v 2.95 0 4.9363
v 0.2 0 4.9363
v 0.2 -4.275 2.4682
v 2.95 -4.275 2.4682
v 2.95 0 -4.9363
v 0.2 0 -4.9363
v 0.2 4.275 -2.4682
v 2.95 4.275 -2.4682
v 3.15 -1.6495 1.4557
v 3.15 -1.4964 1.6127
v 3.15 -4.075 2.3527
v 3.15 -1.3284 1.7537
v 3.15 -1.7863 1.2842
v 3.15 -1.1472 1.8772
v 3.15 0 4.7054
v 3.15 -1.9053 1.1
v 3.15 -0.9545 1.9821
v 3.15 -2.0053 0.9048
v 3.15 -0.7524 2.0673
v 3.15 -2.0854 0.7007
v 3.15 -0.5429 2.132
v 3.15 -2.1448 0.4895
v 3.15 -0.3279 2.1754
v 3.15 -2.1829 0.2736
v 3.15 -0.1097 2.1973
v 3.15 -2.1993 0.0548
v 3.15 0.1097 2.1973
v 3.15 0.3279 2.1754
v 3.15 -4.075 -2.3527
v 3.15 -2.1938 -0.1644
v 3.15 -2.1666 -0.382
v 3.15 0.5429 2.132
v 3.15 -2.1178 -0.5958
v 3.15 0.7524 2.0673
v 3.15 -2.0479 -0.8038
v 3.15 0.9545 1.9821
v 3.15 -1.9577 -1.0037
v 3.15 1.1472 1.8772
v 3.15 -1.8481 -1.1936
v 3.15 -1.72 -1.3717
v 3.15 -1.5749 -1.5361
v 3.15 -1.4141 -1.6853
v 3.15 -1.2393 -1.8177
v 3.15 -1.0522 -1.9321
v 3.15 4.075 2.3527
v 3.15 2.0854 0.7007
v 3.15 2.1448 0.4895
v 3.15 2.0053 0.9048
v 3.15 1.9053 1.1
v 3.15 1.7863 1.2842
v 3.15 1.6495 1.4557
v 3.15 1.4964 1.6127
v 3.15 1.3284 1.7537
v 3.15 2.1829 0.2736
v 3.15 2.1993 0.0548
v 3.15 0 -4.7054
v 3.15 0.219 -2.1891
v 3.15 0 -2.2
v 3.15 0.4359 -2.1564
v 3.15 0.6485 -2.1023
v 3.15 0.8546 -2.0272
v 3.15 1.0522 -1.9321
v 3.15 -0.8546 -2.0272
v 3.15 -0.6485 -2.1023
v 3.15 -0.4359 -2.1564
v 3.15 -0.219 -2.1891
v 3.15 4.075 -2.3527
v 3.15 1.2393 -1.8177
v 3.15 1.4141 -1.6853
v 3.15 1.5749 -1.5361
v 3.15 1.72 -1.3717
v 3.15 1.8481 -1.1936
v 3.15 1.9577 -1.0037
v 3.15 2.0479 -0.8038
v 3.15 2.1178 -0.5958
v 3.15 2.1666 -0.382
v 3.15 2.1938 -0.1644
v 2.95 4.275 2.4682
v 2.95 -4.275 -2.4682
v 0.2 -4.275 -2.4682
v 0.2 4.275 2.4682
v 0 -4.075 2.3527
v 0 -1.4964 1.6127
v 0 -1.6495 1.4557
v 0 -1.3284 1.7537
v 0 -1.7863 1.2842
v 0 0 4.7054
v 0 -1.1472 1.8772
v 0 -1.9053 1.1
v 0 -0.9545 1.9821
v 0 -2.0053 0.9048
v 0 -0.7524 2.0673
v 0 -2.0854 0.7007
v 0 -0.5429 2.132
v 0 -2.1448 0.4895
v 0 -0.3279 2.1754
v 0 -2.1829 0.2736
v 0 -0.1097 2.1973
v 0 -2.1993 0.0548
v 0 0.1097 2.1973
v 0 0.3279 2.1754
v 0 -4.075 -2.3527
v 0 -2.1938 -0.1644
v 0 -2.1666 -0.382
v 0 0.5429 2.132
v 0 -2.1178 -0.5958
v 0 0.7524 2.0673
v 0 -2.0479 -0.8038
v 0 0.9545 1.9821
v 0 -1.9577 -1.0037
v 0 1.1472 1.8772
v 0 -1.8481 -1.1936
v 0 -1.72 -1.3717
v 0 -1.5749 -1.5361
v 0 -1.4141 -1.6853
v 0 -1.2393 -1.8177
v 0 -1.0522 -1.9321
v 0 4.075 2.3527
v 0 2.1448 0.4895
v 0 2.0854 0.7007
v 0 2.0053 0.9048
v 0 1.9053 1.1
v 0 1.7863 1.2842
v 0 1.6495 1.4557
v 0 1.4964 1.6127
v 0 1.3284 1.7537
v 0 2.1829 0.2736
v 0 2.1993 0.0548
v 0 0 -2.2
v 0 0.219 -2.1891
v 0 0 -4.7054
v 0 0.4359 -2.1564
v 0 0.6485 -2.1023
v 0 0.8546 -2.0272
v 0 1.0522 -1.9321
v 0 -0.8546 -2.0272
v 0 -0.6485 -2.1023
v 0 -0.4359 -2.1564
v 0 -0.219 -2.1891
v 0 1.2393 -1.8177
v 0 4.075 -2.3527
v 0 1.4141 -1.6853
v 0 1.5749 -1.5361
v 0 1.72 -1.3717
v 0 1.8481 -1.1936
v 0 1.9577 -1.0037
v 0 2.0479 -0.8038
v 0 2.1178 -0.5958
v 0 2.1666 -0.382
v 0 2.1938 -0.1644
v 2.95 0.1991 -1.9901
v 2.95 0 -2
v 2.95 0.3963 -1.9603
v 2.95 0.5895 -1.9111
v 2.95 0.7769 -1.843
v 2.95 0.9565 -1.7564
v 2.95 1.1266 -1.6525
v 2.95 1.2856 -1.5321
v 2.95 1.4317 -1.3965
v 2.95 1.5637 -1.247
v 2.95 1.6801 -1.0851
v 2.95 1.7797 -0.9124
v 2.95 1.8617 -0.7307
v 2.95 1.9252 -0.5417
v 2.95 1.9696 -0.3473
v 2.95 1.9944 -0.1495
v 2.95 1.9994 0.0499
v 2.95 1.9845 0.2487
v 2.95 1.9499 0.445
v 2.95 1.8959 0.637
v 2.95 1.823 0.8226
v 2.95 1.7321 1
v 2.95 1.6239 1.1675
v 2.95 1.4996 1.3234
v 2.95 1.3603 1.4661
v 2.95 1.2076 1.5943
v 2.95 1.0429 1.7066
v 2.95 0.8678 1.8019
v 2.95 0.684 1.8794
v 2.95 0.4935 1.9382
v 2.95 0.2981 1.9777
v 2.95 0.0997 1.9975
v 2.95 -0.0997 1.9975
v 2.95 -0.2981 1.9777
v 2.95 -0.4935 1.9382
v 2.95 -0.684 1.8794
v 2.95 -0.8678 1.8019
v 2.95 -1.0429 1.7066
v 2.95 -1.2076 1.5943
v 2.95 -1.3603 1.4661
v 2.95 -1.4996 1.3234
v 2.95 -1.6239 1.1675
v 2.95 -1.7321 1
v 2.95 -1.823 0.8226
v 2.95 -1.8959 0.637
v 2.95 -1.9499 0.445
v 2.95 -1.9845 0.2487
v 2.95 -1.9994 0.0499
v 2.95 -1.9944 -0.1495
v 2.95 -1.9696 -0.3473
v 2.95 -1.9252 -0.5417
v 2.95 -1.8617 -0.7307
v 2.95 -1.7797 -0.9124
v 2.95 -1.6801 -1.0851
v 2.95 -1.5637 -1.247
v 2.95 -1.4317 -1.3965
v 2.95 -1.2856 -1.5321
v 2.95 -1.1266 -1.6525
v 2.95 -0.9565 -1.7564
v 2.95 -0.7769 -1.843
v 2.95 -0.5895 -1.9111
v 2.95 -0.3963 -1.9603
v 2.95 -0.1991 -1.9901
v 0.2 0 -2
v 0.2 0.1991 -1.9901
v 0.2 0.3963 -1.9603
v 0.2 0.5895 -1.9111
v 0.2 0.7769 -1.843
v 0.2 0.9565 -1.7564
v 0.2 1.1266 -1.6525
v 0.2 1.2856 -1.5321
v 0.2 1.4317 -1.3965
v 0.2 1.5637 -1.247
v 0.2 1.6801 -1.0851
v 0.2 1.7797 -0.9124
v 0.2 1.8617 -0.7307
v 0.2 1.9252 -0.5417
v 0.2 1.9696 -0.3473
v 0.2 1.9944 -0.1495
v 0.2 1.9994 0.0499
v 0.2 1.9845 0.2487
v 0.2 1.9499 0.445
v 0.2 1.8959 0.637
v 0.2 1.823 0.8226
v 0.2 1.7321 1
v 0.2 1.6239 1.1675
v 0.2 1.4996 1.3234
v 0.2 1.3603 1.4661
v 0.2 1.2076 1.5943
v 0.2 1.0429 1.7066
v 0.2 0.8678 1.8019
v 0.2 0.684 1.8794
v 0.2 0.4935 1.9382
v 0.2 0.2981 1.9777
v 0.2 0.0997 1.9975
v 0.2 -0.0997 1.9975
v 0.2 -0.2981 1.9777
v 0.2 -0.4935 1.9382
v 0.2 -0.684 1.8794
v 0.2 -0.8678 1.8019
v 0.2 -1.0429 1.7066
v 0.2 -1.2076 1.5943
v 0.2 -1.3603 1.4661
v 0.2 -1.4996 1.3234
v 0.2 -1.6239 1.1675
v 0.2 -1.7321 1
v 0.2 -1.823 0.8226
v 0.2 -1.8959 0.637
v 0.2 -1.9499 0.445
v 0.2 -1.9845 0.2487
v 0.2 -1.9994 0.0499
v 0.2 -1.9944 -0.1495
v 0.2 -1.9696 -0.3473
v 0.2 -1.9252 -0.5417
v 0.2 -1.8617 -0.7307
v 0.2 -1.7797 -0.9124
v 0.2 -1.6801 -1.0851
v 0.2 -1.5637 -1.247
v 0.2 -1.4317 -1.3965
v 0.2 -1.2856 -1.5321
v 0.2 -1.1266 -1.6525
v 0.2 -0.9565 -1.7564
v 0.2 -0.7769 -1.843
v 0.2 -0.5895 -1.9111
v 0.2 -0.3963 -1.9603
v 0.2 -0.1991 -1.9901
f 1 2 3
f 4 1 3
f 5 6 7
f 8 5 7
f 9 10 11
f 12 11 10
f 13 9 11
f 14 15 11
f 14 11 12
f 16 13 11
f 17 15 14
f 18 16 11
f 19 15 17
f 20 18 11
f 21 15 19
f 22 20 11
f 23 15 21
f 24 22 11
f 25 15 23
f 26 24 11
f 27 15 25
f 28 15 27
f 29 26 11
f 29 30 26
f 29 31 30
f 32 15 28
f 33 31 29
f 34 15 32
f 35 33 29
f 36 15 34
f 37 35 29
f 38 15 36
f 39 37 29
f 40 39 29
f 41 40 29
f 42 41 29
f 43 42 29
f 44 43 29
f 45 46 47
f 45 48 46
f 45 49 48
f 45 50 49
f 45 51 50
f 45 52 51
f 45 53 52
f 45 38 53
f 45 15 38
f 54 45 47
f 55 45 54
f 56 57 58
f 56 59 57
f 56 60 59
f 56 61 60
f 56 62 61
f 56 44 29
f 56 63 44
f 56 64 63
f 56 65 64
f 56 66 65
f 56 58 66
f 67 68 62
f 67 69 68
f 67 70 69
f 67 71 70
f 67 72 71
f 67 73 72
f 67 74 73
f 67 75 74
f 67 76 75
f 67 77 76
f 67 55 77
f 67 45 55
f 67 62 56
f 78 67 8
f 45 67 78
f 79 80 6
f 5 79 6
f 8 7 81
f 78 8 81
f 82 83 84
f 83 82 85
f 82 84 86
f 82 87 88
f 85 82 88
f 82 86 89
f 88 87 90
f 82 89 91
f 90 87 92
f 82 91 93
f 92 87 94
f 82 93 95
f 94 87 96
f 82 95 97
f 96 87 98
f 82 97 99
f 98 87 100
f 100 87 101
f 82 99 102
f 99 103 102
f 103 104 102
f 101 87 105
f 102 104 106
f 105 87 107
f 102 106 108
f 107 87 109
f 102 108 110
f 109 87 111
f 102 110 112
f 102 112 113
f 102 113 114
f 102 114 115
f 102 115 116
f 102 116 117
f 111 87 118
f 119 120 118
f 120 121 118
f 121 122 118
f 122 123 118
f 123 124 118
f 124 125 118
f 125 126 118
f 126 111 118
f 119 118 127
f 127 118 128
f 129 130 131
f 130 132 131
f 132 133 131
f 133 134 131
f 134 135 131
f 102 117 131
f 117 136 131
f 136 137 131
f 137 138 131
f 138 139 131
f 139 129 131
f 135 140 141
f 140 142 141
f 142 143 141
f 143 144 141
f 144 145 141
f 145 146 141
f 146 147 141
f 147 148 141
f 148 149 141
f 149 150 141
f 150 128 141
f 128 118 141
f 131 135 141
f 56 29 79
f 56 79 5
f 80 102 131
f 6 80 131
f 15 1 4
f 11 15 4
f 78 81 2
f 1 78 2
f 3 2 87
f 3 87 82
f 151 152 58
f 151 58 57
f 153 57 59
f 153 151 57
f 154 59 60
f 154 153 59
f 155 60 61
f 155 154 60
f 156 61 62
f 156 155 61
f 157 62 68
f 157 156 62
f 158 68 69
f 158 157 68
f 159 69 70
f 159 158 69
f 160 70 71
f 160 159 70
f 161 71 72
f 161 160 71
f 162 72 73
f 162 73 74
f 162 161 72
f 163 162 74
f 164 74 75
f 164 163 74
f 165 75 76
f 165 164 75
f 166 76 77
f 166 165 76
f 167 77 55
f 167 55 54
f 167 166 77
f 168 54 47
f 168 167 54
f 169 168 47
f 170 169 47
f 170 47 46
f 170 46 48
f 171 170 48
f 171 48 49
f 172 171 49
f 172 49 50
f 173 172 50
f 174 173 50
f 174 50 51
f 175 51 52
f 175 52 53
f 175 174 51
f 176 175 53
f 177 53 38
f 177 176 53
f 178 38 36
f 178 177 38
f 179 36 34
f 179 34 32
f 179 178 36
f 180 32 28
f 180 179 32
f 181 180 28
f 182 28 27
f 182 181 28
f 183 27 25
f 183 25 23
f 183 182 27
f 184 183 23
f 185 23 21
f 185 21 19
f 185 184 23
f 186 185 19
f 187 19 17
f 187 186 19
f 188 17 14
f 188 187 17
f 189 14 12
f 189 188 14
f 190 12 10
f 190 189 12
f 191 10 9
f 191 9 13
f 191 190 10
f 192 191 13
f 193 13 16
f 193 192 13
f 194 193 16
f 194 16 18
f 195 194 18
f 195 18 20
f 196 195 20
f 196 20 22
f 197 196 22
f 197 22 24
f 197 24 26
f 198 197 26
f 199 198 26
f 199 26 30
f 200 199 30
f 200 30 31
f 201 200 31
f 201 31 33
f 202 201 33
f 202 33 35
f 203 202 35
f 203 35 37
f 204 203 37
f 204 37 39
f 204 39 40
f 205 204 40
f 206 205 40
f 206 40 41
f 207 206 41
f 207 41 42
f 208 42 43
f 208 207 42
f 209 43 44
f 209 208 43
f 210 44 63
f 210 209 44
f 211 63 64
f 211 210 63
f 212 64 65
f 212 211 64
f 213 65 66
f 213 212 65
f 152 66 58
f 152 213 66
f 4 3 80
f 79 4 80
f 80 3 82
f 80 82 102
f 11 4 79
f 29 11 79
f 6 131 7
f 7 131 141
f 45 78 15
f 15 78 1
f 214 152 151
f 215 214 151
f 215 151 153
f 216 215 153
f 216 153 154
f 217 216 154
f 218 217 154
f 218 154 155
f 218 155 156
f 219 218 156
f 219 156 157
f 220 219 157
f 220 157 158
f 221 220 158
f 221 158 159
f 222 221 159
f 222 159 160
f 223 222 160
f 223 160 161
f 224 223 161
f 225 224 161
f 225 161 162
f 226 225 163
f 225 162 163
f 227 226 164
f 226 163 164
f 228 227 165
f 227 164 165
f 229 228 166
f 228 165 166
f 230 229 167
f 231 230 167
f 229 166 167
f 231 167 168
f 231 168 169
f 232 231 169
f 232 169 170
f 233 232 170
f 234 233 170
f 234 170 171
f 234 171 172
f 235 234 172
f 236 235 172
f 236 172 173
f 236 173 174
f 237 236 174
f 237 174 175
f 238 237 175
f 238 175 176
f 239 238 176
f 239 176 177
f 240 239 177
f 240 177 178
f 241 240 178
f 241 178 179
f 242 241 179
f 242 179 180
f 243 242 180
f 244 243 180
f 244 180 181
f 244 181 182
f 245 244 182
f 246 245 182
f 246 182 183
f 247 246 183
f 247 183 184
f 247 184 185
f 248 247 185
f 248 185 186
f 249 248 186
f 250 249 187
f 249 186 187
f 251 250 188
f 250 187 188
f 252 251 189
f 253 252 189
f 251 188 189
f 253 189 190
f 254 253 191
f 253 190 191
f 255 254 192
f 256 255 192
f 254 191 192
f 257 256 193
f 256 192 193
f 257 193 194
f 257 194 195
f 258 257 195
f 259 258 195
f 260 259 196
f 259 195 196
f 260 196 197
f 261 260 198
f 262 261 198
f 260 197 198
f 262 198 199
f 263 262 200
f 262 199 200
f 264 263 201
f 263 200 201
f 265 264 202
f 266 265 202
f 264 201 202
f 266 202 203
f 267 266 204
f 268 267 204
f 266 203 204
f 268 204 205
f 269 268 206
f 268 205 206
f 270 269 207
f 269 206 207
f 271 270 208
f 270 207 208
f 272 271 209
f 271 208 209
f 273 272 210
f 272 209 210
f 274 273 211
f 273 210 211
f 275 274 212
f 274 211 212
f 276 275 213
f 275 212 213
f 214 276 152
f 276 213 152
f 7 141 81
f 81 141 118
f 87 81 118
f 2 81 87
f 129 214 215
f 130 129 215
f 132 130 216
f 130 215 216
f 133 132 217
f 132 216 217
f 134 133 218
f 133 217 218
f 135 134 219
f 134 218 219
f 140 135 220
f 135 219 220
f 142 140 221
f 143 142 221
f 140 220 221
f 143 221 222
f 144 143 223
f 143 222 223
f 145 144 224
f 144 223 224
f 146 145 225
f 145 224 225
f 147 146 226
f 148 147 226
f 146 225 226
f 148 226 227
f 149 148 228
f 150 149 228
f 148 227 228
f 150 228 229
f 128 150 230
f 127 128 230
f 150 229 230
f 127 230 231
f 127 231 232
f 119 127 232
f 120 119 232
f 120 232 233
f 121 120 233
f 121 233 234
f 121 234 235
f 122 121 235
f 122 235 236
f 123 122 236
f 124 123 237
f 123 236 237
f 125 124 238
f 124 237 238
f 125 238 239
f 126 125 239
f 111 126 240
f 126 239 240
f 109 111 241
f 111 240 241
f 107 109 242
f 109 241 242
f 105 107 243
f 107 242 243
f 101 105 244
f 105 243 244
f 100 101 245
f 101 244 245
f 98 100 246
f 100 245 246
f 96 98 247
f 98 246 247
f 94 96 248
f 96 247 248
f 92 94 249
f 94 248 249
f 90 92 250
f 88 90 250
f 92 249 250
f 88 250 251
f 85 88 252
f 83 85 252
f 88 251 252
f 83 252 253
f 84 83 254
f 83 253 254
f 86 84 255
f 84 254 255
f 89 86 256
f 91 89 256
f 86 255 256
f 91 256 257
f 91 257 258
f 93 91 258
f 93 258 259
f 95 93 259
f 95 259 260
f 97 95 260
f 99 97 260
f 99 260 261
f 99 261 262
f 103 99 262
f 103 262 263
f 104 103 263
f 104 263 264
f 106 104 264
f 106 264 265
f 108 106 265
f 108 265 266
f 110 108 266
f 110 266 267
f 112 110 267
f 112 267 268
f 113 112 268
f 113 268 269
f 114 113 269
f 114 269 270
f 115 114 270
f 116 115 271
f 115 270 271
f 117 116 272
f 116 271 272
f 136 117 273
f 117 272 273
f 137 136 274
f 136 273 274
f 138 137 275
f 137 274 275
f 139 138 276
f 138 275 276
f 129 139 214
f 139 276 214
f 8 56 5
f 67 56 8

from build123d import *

# Parameters (mm, degrees)
BOSS_EXTRUDE3_DEPTH = 3.15
SKETCH3_R           = 2
CUT_EXTRUDE2_DEPTH  = 7
CHAMFER1_SIZE       = 0.2


with BuildPart() as part:
    # Sketch2 → Boss-Extrude3 (new body)
    with BuildSketch(Plane(origin=(0, 0, 0), x_dir=(0, 0, -1), z_dir=(1, 0, 0))):
        Polygon((4.936344802, 0), (2.468172401, 4.275), (-2.468172401, 4.275), (-4.936344802, 0), (-2.468172401, -4.275), (2.468172401, -4.275), align=None)
    extrude(amount=BOSS_EXTRUDE3_DEPTH)

    # Sketch3 → Cut-Extrude2 (cut)
    with BuildSketch(Plane(origin=(3.15, 0, 0), x_dir=(0, 0, -1), z_dir=(1, 0, 0))):
        Circle(SKETCH3_R)
    extrude(amount=-CUT_EXTRUDE2_DEPTH, mode=Mode.SUBTRACT)

    # Chamfer1
    chamfer1_edges = [part.edges().sort_by_distance(p)[0] for p in [
        (3.15, 4.275, 0),
        (3.15, 2.1375, 3.702258601),
        (3.15, -2.1375, 3.702258601),
        (3.15, -4.275, 0),
        (0, 0, 2),
        (3.15, 0, 2),
        (3.15, -2.1375, -3.702258601),
        (0, -4.275, 0),
        (0, -2.1375, 3.702258601),
        (0, 2.1375, 3.702258601),
        (3.15, 2.1375, -3.702258601),
        (0, 4.275, 0),
        (0, 2.1375, -3.702258601),
        (0, -2.1375, -3.702258601),
    ]]
    chamfer(chamfer1_edges, length=CHAMFER1_SIZE)


solid = part.part
